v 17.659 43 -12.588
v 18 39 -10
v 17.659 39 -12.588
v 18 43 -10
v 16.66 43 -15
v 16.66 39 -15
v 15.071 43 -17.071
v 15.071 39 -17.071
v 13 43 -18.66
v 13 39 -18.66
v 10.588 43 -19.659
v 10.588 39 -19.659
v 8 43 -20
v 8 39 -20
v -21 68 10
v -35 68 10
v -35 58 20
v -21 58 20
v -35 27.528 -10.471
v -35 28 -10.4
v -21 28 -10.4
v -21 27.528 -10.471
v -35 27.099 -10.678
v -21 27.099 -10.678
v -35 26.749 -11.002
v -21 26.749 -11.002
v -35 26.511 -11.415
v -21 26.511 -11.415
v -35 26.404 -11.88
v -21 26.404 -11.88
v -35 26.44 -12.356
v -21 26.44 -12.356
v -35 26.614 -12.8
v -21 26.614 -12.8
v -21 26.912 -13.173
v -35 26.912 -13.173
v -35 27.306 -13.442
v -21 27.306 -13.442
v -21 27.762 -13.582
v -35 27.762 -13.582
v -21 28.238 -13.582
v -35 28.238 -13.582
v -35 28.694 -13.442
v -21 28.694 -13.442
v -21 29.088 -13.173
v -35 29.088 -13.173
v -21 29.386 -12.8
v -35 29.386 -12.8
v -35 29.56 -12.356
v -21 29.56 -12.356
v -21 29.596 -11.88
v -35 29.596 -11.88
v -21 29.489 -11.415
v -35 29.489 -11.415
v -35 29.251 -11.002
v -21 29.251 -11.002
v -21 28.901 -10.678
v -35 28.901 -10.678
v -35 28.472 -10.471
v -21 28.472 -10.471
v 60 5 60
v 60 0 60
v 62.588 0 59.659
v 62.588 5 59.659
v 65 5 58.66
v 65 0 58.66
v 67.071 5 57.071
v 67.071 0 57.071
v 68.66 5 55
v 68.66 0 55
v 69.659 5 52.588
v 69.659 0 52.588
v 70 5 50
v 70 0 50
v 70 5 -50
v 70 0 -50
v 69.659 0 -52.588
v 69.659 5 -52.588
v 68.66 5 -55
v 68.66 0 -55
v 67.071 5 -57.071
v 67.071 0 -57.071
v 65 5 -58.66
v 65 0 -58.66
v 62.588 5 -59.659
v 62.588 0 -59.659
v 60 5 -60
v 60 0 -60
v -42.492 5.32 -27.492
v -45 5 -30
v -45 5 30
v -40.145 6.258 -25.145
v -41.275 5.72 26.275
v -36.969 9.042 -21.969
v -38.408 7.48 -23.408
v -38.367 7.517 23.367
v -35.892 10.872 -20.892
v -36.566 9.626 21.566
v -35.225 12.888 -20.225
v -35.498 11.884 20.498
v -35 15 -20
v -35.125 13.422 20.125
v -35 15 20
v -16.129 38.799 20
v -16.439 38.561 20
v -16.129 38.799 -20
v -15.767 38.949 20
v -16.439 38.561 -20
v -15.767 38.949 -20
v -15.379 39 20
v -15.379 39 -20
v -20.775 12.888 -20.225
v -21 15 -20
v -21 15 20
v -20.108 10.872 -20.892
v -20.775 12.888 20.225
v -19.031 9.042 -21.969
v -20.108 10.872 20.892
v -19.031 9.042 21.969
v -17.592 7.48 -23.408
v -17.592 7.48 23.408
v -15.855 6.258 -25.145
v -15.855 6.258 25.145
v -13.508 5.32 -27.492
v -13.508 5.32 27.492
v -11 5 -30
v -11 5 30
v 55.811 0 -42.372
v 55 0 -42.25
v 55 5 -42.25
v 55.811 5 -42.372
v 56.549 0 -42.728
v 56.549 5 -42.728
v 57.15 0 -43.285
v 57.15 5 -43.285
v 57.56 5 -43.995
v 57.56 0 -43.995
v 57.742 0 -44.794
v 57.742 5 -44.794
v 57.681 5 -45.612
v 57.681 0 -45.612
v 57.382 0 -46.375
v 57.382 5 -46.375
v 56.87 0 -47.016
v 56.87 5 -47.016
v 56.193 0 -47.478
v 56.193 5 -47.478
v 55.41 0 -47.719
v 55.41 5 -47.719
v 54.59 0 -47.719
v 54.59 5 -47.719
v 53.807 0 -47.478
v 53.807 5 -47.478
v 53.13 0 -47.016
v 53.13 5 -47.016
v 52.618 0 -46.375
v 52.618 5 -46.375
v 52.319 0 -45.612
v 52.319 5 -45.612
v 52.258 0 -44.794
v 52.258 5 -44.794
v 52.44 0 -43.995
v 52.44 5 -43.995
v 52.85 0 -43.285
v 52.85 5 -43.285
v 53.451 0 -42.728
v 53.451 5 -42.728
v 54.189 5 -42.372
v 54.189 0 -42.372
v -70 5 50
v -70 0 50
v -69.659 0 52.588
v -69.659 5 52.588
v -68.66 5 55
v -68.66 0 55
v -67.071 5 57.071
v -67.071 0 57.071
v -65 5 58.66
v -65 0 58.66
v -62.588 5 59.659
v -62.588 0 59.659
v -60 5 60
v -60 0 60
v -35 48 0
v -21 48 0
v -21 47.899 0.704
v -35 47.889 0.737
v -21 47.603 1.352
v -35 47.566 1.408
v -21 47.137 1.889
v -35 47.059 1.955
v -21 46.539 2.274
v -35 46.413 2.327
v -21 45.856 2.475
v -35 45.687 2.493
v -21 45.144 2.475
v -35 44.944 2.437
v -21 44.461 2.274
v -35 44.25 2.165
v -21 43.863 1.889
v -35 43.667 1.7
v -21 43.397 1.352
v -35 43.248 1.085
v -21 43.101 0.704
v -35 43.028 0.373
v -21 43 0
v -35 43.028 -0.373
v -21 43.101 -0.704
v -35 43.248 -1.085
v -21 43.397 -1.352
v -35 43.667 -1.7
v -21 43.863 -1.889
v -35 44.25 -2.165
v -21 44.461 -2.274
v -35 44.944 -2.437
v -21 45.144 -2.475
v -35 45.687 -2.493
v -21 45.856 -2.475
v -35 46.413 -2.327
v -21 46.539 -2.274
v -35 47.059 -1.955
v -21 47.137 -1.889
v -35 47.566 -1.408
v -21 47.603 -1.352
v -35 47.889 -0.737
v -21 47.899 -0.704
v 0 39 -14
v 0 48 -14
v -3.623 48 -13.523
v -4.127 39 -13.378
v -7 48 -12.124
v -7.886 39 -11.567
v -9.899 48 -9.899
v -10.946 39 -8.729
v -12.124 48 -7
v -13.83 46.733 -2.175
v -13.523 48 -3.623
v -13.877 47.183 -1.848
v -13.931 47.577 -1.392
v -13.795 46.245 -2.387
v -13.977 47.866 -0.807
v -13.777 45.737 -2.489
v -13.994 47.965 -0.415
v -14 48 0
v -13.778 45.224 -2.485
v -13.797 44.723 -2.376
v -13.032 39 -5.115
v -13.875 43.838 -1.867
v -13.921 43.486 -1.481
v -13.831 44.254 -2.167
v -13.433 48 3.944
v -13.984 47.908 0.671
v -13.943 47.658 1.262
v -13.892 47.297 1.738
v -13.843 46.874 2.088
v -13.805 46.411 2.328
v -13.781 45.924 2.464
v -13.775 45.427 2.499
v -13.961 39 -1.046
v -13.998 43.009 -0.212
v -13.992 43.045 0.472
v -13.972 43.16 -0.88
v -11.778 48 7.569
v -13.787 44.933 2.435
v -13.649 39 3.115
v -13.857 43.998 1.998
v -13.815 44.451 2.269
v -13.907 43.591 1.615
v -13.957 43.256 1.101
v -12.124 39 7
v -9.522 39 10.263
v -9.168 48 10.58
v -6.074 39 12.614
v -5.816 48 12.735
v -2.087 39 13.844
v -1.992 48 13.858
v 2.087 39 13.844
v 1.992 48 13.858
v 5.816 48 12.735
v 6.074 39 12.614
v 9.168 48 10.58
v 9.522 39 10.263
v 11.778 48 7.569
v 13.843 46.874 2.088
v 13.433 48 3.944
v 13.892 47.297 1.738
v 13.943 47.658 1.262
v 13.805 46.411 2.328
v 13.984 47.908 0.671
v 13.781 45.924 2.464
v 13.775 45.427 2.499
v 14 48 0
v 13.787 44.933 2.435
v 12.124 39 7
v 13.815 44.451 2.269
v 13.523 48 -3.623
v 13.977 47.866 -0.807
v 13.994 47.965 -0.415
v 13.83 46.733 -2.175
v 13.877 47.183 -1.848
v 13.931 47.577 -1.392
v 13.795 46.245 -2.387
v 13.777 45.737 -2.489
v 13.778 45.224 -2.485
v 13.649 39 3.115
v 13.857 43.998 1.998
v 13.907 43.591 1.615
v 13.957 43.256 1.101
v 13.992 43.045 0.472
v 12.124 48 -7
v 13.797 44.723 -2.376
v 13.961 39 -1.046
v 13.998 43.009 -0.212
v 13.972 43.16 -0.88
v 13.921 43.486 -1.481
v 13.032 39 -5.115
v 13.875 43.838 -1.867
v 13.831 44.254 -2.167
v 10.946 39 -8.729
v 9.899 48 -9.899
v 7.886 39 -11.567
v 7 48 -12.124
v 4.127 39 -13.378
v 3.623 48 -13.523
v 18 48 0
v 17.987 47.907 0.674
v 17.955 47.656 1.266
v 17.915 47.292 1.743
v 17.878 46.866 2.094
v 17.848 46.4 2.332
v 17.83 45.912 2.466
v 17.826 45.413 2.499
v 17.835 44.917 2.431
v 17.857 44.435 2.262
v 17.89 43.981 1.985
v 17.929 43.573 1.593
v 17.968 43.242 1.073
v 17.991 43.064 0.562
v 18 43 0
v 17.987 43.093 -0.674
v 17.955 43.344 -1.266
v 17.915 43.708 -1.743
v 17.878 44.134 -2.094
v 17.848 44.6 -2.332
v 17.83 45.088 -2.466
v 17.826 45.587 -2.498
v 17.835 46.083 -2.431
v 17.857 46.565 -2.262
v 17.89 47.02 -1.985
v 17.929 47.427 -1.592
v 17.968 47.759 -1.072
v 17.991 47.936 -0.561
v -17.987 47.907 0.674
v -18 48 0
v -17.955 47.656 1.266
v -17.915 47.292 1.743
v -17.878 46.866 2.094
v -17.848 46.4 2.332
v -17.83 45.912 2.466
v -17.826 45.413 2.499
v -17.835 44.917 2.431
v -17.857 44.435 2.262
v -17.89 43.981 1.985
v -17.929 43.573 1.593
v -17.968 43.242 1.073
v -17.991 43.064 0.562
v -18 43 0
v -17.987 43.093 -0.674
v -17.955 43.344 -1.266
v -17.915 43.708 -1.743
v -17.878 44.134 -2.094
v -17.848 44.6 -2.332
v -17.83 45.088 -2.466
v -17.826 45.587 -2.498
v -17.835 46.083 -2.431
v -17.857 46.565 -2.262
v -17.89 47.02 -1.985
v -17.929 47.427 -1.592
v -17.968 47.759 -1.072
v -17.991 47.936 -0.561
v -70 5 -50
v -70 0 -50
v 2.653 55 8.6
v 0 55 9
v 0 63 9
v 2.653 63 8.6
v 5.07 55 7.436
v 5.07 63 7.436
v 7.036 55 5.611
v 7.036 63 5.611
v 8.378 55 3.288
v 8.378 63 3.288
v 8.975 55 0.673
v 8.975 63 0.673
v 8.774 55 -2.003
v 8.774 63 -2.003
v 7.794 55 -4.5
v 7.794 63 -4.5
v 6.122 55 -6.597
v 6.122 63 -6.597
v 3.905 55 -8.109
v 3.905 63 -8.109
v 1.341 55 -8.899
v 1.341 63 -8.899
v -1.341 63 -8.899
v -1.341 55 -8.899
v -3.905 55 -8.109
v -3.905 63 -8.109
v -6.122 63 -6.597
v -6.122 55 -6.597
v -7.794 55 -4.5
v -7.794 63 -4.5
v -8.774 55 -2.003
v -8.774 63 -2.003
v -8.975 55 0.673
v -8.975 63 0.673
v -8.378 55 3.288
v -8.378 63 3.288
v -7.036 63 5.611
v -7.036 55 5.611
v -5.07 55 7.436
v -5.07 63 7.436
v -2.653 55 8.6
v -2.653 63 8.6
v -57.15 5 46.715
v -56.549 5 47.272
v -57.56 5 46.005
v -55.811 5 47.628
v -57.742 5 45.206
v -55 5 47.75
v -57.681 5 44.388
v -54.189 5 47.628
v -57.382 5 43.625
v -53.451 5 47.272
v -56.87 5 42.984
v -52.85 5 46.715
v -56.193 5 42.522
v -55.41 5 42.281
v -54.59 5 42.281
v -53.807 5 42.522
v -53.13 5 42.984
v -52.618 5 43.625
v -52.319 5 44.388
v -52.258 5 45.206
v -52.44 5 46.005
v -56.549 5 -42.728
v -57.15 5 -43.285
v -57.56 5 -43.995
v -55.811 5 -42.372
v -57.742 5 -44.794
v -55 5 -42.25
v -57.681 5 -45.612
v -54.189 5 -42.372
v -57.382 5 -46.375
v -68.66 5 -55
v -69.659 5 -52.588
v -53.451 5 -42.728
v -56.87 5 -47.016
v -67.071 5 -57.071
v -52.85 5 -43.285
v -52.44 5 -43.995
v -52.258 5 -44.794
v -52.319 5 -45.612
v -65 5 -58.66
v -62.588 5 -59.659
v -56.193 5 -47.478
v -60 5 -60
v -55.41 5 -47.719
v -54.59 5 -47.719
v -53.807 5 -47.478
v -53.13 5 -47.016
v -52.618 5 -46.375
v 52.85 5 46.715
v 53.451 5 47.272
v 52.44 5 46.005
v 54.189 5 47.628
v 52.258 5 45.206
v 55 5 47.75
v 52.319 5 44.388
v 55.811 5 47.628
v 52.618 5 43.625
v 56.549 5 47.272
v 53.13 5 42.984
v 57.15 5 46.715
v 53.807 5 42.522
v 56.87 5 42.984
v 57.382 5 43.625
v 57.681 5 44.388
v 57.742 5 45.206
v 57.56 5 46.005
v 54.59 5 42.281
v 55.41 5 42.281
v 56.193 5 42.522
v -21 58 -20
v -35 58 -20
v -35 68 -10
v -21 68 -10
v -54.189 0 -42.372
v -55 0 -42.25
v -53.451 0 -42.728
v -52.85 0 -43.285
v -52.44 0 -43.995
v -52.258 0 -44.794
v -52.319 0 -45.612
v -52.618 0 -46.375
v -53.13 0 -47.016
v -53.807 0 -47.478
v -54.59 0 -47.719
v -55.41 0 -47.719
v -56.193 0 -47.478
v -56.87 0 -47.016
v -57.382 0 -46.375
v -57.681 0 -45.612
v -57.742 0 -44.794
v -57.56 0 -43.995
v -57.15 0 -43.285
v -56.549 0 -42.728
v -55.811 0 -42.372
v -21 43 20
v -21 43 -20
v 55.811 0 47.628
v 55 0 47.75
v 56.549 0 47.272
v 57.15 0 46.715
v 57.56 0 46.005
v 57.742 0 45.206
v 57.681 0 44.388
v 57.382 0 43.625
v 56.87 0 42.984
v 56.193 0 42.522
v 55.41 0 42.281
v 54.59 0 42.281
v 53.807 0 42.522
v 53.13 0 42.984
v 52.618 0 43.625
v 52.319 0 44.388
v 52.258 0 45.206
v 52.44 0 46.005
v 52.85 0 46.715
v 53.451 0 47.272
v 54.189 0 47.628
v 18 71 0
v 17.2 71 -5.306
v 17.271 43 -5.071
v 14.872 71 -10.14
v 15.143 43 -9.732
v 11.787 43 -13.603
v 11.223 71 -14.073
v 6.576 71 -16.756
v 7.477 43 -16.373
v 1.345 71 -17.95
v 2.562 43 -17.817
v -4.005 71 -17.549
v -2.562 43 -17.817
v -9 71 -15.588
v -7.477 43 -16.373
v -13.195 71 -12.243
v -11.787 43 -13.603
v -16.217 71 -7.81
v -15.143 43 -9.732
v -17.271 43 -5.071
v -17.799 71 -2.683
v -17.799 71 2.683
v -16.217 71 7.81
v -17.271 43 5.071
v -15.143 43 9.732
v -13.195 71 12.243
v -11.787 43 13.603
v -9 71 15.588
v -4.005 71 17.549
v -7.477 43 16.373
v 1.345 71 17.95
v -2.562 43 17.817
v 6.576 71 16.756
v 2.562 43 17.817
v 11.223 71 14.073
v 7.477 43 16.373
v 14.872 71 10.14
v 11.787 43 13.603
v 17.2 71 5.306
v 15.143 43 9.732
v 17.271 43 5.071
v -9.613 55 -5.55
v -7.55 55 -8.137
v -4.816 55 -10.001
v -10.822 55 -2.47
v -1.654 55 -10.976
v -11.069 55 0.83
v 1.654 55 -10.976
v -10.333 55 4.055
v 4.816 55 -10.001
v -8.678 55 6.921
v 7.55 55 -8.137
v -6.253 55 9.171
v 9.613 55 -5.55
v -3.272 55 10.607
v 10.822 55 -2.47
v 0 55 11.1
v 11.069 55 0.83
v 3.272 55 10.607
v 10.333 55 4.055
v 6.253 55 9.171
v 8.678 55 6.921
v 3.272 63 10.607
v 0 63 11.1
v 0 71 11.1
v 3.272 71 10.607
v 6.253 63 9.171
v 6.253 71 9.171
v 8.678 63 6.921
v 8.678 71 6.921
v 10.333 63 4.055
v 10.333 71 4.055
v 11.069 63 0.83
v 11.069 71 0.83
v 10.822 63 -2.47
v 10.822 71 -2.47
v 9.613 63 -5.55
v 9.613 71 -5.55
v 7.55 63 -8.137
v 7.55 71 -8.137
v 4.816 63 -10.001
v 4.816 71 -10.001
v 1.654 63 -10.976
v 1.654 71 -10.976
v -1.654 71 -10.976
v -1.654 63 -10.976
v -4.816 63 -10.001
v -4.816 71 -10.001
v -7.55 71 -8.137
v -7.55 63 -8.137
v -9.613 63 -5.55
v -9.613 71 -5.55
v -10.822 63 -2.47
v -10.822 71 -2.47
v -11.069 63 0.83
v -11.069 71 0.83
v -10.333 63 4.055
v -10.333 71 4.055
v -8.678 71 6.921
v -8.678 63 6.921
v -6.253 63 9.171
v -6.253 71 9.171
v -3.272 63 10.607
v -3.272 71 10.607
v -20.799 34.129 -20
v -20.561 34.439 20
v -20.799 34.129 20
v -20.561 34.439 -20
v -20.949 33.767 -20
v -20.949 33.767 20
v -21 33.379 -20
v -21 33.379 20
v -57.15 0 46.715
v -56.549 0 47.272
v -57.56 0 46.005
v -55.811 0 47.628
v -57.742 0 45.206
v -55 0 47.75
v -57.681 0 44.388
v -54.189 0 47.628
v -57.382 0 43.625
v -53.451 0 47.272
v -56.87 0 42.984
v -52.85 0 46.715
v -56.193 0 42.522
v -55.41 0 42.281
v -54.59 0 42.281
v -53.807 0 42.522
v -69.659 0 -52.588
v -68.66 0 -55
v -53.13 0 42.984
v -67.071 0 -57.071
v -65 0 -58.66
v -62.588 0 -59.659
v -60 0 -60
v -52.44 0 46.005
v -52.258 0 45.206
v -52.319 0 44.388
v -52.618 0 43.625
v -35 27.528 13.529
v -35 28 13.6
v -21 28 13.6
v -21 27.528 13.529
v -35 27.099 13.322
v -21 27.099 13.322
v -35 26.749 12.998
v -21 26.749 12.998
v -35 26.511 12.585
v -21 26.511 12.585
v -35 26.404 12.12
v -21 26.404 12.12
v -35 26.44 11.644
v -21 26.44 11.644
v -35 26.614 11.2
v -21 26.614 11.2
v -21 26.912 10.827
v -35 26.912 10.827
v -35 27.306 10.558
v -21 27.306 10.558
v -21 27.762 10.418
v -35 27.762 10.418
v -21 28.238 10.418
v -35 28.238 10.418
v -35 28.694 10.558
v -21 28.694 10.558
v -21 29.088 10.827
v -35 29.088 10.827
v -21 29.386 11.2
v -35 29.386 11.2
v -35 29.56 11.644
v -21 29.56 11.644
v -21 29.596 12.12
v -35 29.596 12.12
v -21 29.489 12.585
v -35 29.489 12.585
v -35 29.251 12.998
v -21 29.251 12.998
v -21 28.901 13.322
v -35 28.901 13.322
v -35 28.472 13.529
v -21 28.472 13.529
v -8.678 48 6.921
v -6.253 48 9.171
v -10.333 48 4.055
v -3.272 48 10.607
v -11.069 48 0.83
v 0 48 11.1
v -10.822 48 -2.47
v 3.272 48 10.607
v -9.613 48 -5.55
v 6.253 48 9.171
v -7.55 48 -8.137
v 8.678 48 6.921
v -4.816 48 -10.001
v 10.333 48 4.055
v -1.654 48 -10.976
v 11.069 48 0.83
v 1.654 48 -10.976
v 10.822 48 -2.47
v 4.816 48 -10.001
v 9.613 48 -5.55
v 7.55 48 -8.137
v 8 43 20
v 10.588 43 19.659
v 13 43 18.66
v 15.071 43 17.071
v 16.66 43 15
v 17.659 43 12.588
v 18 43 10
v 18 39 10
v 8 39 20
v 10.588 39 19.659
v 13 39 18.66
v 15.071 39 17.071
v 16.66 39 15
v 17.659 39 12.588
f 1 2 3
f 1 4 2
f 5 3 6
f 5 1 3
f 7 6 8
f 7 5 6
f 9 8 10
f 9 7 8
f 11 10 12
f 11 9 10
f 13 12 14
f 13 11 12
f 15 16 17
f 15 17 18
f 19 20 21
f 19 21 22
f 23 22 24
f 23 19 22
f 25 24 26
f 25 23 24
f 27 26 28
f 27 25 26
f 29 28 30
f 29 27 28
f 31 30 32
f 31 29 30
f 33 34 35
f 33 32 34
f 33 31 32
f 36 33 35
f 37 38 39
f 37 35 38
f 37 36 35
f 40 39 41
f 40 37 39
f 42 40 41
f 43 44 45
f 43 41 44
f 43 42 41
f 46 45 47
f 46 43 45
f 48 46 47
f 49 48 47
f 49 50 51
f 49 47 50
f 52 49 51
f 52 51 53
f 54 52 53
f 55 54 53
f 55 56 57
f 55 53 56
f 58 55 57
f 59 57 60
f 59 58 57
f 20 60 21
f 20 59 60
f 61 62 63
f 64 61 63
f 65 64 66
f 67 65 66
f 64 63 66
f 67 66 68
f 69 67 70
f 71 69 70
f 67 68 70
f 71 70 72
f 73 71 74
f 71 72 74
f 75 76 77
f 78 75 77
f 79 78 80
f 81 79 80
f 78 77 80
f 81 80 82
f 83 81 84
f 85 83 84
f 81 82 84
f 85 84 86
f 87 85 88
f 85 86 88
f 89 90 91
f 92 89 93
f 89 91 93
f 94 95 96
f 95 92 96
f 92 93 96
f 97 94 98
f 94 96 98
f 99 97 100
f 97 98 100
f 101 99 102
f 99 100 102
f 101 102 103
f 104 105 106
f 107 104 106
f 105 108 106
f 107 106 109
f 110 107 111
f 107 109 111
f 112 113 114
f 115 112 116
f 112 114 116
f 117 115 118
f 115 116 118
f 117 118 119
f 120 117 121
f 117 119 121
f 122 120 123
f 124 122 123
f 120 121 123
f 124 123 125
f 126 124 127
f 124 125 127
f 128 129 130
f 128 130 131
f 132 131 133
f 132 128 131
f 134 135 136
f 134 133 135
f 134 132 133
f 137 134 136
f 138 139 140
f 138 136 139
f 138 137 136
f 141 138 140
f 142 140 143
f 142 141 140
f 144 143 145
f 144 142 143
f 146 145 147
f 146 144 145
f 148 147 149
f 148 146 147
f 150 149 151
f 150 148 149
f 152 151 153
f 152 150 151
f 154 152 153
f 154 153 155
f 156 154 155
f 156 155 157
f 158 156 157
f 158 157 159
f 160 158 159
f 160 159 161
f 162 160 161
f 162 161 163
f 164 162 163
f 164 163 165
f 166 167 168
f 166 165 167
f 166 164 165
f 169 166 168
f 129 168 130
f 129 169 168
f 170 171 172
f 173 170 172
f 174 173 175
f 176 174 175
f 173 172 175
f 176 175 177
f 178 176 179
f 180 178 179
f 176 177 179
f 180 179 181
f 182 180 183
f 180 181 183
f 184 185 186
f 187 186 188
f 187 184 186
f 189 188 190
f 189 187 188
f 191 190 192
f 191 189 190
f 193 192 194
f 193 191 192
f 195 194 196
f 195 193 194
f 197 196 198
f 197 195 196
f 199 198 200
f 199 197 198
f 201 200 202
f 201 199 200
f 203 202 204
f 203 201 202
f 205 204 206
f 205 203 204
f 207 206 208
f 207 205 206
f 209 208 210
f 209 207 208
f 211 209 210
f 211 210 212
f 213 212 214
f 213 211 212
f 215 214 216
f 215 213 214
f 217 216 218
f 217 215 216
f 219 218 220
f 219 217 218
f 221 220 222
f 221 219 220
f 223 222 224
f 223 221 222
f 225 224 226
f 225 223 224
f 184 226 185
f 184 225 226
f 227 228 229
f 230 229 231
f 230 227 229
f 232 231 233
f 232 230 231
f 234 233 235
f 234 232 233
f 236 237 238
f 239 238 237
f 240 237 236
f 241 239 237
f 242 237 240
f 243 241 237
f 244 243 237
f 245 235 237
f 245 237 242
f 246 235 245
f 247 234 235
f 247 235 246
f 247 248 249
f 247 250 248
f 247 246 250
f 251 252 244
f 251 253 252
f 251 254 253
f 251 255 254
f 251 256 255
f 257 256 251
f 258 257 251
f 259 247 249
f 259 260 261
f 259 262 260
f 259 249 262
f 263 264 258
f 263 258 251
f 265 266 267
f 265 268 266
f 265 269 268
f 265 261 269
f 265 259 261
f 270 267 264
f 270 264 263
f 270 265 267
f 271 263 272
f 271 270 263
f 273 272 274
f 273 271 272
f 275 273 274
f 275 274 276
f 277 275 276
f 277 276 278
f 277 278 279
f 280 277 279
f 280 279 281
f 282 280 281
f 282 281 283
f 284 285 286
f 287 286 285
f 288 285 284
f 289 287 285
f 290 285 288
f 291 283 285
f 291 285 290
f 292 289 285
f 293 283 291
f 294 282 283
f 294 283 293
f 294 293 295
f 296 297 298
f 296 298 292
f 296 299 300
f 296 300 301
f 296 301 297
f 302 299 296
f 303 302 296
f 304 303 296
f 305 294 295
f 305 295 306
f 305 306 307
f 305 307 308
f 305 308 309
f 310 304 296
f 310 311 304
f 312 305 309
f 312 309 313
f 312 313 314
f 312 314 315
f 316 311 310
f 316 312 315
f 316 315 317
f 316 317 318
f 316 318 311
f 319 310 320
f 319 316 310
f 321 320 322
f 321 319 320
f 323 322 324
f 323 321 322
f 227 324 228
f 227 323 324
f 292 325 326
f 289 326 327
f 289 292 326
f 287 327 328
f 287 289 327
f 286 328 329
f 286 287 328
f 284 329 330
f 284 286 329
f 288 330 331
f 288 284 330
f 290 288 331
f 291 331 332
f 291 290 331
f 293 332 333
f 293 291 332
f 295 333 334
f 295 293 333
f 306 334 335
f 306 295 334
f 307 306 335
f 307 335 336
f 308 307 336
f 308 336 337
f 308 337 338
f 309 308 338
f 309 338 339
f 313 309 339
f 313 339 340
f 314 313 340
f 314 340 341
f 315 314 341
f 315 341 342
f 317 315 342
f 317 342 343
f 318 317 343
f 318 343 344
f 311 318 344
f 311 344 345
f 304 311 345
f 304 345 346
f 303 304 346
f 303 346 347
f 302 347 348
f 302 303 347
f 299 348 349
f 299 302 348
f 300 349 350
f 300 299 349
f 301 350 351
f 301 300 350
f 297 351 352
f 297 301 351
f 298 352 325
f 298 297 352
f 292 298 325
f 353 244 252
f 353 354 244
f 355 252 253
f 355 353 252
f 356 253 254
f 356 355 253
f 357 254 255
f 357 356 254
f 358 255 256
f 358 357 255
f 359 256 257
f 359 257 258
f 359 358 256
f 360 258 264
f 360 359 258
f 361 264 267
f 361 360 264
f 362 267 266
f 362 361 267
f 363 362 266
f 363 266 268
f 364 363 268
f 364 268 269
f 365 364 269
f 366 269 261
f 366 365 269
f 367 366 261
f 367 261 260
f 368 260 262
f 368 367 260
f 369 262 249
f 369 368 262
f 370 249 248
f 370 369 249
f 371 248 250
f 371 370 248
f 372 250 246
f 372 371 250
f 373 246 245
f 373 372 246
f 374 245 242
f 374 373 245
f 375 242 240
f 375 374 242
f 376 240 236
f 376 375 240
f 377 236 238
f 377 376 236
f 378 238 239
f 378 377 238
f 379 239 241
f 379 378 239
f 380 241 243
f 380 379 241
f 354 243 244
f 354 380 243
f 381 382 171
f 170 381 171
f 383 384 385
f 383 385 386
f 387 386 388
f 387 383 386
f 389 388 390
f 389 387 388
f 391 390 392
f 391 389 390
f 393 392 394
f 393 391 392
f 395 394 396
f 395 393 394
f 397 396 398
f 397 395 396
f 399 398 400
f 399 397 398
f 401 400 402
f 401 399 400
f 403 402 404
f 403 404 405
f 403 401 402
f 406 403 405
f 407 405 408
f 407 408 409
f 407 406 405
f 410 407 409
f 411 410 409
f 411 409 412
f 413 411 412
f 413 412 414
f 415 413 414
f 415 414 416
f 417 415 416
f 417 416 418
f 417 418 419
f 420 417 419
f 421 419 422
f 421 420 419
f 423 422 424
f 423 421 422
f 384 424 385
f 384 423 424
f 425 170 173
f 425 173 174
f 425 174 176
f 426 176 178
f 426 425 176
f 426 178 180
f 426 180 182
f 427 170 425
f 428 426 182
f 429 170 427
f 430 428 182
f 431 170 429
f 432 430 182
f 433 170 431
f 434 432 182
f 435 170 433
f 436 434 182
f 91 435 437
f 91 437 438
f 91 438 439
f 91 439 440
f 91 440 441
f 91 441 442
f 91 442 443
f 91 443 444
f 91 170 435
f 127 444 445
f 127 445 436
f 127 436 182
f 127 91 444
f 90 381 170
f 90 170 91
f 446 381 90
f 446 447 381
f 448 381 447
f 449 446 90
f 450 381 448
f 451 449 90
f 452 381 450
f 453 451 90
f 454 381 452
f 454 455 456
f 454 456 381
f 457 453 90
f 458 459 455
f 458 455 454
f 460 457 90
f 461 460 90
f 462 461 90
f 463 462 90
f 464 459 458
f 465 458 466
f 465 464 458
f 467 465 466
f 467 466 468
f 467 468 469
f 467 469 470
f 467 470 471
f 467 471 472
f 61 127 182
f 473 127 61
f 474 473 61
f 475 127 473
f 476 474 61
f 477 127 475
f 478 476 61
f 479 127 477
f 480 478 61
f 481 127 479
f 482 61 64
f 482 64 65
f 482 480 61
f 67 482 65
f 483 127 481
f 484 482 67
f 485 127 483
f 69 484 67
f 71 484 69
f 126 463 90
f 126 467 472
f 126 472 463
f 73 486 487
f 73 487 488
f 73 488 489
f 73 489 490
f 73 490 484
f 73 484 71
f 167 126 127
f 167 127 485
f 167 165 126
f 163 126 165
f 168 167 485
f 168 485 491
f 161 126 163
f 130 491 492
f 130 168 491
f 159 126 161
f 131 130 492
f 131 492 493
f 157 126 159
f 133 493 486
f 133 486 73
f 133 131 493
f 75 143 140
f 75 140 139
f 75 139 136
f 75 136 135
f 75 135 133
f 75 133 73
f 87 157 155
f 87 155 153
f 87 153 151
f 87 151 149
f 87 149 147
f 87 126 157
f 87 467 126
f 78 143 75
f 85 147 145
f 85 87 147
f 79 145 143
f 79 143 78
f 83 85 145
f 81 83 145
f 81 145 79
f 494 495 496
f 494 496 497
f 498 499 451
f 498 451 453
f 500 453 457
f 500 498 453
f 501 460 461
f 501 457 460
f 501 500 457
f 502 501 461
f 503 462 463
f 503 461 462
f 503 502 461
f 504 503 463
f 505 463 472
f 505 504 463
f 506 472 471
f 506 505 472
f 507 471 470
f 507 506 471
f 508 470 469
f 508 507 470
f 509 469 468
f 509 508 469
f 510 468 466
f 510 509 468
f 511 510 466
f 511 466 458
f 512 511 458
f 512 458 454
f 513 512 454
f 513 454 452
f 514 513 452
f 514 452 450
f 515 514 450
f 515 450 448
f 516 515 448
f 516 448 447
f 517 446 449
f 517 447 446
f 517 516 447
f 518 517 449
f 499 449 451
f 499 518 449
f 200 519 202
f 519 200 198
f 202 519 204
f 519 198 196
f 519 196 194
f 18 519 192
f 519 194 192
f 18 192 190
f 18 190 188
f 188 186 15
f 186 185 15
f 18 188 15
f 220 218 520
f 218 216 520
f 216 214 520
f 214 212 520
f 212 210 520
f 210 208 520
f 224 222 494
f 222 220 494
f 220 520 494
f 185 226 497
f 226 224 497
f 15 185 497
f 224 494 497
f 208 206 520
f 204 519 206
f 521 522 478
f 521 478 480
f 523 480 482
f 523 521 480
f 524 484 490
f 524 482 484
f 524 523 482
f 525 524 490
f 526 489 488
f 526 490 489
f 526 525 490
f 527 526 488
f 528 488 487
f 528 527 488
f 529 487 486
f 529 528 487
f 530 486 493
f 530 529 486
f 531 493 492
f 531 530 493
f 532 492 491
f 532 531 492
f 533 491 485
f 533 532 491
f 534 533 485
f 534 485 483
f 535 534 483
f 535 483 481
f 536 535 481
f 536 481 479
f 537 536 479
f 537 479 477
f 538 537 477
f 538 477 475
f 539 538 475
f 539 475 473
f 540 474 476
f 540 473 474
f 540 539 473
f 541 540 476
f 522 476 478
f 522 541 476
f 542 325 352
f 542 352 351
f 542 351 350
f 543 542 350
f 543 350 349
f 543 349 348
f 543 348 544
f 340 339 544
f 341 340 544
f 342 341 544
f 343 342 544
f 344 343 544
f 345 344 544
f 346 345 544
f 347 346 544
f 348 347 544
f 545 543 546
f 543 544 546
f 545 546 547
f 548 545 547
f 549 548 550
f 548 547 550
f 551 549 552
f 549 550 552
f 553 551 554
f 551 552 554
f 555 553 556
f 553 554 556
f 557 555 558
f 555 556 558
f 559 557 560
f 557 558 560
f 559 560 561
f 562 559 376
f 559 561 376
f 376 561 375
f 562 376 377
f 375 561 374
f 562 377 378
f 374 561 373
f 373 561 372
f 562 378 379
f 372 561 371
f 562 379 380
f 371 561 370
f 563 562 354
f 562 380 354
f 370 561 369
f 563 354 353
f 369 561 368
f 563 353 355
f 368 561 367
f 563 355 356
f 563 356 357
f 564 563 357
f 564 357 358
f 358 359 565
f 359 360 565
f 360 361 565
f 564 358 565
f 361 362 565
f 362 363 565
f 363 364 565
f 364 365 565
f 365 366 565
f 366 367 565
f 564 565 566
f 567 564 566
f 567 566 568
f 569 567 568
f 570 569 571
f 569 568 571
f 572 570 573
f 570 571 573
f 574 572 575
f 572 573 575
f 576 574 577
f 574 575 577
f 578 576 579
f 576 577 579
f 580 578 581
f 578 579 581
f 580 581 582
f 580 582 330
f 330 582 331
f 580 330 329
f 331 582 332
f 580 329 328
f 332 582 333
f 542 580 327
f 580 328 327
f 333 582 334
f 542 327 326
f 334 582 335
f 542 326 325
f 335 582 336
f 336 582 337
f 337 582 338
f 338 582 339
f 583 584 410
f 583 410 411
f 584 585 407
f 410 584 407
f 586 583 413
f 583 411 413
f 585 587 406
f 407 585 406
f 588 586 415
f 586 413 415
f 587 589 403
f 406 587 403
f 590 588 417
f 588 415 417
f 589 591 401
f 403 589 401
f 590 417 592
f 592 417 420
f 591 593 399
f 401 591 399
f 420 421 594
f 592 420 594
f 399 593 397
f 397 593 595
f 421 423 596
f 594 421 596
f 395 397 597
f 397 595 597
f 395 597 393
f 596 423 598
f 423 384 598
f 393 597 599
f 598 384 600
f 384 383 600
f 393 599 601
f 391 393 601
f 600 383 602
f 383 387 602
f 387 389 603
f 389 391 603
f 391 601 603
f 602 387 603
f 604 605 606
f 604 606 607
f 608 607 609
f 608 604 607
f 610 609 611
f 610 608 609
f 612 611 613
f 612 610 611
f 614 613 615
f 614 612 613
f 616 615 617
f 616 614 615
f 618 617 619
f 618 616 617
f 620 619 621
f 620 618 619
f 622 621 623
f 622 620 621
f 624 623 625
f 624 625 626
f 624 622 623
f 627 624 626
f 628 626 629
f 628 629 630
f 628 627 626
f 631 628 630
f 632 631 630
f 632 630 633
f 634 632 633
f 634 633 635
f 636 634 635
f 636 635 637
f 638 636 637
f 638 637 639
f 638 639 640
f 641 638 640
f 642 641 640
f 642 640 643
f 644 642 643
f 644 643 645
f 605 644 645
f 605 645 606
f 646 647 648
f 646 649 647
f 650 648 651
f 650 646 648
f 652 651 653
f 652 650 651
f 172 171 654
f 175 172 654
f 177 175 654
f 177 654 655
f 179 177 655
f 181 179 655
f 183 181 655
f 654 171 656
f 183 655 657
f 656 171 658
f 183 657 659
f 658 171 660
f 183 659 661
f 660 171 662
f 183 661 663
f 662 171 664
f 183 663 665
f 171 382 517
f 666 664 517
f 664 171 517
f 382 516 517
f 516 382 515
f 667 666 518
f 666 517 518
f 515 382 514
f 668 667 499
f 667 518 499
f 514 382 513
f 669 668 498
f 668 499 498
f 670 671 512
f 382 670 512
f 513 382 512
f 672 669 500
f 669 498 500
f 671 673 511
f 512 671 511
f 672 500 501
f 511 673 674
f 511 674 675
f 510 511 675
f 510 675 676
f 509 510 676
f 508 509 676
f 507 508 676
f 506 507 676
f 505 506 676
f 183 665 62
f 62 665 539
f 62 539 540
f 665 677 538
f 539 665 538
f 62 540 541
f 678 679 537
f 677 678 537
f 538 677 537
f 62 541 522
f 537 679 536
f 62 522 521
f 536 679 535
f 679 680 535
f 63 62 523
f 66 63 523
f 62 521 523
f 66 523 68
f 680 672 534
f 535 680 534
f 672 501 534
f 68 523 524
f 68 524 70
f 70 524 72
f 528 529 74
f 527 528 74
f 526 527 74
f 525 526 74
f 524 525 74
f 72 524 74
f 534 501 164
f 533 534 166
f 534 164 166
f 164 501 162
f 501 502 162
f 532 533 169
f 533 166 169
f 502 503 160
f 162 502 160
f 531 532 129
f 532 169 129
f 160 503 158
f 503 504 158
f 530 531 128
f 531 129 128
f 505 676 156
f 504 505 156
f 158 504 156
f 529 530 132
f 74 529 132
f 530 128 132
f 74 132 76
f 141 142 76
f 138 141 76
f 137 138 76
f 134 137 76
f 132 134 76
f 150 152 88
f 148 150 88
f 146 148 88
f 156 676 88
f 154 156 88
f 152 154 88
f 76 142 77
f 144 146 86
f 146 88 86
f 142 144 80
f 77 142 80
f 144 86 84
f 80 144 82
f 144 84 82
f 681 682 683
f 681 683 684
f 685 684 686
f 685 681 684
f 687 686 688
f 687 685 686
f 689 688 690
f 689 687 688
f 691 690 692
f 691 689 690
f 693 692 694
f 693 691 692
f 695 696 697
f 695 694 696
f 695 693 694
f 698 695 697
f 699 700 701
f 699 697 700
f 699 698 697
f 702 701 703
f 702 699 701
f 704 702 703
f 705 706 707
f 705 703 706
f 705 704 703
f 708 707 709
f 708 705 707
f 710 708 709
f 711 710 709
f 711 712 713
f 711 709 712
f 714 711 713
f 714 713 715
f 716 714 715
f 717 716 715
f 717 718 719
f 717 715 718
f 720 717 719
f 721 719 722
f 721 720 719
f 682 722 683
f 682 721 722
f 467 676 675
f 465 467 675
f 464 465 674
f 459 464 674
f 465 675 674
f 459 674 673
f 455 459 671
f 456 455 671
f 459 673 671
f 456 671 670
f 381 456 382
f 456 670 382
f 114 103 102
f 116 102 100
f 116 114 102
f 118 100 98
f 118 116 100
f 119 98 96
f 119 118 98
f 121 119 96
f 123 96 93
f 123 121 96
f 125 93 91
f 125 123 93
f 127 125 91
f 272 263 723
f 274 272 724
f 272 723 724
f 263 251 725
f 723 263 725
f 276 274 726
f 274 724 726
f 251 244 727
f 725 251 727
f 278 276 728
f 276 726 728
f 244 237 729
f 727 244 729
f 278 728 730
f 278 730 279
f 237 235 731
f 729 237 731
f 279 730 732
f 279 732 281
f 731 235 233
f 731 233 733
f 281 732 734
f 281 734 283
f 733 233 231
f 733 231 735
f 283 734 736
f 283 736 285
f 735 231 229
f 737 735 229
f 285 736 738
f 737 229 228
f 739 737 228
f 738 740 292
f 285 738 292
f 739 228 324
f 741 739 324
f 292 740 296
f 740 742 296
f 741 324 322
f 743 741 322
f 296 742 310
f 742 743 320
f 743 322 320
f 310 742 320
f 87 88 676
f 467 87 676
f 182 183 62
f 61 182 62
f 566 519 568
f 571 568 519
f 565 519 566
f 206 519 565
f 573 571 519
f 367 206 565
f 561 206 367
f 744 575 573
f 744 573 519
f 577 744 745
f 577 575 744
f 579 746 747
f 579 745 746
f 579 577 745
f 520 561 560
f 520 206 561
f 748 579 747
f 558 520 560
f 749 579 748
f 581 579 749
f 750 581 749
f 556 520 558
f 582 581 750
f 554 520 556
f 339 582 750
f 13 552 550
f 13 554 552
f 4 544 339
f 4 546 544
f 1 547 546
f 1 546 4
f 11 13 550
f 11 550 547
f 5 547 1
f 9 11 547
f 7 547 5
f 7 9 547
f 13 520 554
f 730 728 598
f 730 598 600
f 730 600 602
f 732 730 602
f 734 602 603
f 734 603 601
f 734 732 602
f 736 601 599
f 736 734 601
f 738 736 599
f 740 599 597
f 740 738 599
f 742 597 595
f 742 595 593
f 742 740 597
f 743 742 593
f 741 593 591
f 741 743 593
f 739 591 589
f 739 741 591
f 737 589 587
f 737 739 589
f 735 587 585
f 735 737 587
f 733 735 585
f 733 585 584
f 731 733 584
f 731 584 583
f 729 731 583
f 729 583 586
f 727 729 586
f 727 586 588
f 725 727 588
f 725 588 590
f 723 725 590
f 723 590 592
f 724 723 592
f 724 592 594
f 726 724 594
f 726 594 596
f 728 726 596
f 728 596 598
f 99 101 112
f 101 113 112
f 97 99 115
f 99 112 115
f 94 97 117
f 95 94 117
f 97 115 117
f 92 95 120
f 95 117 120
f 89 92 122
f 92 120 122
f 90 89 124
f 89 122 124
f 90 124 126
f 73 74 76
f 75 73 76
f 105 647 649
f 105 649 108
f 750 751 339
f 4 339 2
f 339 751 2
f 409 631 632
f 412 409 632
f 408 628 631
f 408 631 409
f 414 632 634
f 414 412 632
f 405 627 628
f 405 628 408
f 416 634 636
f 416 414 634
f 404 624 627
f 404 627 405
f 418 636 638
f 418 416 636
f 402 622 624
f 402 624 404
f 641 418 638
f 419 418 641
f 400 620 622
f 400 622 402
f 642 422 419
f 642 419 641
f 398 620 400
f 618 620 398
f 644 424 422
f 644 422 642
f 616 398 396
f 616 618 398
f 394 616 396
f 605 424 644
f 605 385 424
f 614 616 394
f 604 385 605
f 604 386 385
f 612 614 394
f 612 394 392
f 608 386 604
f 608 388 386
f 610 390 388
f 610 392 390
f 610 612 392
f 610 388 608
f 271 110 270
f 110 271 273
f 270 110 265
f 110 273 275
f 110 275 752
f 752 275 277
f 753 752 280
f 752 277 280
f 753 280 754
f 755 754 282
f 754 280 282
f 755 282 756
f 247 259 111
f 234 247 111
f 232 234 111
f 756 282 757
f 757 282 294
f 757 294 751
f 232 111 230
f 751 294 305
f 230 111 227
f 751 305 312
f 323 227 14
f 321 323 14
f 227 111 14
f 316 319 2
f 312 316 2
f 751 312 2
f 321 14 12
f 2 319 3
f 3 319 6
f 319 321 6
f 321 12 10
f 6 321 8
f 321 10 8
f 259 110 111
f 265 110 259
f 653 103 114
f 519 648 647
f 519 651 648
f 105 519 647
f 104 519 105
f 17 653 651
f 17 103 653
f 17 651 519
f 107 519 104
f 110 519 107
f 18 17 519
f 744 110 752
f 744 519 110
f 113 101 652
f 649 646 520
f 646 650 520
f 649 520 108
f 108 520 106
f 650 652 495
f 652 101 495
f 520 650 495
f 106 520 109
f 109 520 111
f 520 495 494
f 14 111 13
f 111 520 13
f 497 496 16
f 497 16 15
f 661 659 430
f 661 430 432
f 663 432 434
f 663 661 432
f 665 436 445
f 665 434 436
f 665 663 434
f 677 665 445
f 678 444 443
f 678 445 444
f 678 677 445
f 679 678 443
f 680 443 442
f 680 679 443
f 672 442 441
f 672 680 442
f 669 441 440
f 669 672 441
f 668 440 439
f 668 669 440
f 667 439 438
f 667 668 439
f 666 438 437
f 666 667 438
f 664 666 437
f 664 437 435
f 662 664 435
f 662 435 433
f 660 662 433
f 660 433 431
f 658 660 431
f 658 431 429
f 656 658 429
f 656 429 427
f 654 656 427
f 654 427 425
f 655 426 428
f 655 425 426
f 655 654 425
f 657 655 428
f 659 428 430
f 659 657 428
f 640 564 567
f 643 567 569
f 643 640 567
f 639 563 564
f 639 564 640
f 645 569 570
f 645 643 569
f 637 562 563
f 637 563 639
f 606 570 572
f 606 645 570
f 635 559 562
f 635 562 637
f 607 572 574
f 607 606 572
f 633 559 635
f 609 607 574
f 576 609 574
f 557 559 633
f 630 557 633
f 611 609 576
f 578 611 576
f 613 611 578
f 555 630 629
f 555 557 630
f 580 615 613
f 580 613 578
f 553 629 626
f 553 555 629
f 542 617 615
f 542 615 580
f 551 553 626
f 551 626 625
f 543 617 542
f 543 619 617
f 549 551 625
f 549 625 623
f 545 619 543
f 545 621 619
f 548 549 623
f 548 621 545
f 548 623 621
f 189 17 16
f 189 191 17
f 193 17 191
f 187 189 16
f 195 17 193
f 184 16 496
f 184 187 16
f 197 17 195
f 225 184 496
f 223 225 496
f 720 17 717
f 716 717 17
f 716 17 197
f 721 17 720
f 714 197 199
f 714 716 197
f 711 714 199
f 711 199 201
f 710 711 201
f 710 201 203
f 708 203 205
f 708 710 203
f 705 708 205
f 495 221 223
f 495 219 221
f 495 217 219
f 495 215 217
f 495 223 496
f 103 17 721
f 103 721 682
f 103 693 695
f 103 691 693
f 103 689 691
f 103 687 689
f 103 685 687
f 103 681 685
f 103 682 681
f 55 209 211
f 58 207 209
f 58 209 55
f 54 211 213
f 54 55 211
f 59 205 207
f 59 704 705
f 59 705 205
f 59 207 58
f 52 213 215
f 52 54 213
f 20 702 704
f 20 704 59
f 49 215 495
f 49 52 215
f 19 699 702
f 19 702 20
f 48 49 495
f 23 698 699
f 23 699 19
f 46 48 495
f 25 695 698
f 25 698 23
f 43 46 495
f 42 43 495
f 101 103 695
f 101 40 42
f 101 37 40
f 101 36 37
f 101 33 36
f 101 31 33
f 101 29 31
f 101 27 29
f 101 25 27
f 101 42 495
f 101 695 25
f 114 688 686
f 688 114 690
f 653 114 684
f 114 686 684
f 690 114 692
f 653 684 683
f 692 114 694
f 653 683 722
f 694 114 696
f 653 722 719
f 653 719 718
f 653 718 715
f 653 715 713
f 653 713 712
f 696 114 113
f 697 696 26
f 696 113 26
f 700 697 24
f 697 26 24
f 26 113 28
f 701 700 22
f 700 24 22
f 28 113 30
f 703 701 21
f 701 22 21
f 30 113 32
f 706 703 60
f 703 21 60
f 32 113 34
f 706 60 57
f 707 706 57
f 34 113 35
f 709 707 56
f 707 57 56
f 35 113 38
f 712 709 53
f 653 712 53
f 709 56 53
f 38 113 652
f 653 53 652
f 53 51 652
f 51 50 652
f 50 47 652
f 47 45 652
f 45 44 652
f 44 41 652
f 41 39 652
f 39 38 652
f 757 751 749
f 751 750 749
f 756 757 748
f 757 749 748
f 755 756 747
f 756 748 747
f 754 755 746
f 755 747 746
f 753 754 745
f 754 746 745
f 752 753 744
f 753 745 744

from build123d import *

# Parameters (mm, degrees)
BENCH_FOOTPRINT_140X120_DEPTH           = 5
BACKBONE_START                          = -20
BACKBONE_PROFILE_W                      = 14
BACKBONE_PROFILE_H                      = 63
BACKBONE_DEPTH                          = 40
REMOVABLE_SERVO_MOUNT_M3_START          = -40
REMOVABLE_SERVO_MOUNT_M3_PROFILE_R      = 1.6
REMOVABLE_SERVO_MOUNT_M3_DEPTH          = 155.560027933
BEARING_BRIDGE_START                    = 39
BEARING_BRIDGE_PROFILE_W                = 53
BEARING_BRIDGE_PROFILE_H                = 40
BEARING_BRIDGE_DEPTH                    = 4
BRIDGE_HORN_CLEARANCE_START             = 38
BRIDGE_HORN_CLEARANCE_PROFILE_R         = 14
BRIDGE_HORN_CLEARANCE_DEPTH             = 77.560027933
DRIVE_COLLAR_CHAMBER_START              = 43
DRIVE_COLLAR_CHAMBER_PROFILE_R          = 18
DRIVE_COLLAR_CHAMBER_PROFILE_R_2        = 14
DRIVE_COLLAR_CHAMBER_DEPTH              = 5
BEARING_TOWER_START                     = 48
BEARING_TOWER_PROFILE_R                 = 18
BEARING_TOWER_PROFILE_R_2               = 11.1
BEARING_TOWER_DEPTH                     = 23
BEARING_SEPARATION_SHOULDER_START       = 55
BEARING_SEPARATION_SHOULDER_PROFILE_R   = 11.1
BEARING_SEPARATION_SHOULDER_PROFILE_R_2 = 9
BEARING_SEPARATION_SHOULDER_DEPTH       = 8
BENCH_CLAMP_HOLES_START                 = -1
BENCH_CLAMP_HOLES_PROFILE_R             = 2.75
BENCH_CLAMP_HOLES_DEPTH                 = 118.365802537
YAW_CROSSBOLT_ACCESS_START              = -40
YAW_CROSSBOLT_ACCESS_PROFILE_R          = 2.5
YAW_CROSSBOLT_ACCESS_DEPTH              = 157.365802537
FILLET2_R                               = 10
BOSS_EXTRUDE1_DEPTH                     = 40
FILLET6_R                               = 1.5
FILLET7_R                               = 10
CHAMFER1_SIZE                           = 10


with BuildPart() as part:
    # Bench_footprint_140x120_profile → Bench_footprint_140x120 (new body)
    with BuildSketch(Plane(origin=(0, 0, 0), x_dir=(1, 0, 0), z_dir=(0, 1, 0))):
        with BuildLine():
            Line((-60, -60), (60, -60))
            ThreePointArc((60, -60), (67.071067812, -57.071067812), (70, -50))
            Line((70, -50), (70, 50))
            ThreePointArc((70, 50), (67.071067812, 57.071067812), (60, 60))
            Line((60, 60), (-60, 60))
            ThreePointArc((-60, 60), (-67.071067812, 57.071067812), (-70, 50))
            Line((-70, 50), (-70, -50))
            ThreePointArc((-70, -50), (-67.071067812, -57.071067812), (-60, -60))
        make_face()
    extrude(amount=BENCH_FOOTPRINT_140X120_DEPTH)

    # Backbone_profile → Backbone (add)
    with BuildSketch(Plane.XY.offset(BACKBONE_START)):
        with Locations((-28, 36.5)):
            Rectangle(BACKBONE_PROFILE_W, BACKBONE_PROFILE_H)
    extrude(amount=BACKBONE_DEPTH)

    # Removable_servo_mount_M3_profile → Removable_servo_mount_M3 (cut, through all)
    with BuildSketch(Plane(origin=(0, 0, 0), x_dir=(0, 0, -1), z_dir=(1, 0, 0)).offset(REMOVABLE_SERVO_MOUNT_M3_START)):
        with Locations(Location((12, 28, 0), (0, 0, 180))):
            Circle(REMOVABLE_SERVO_MOUNT_M3_PROFILE_R)
        with Locations(Location((-12, 28, 0), (0, 0, 180))):
            Circle(REMOVABLE_SERVO_MOUNT_M3_PROFILE_R)
    extrude(amount=REMOVABLE_SERVO_MOUNT_M3_DEPTH, mode=Mode.SUBTRACT)

    # Bearing_bridge_profile → Bearing_bridge (add)
    with BuildSketch(Plane(origin=(0, 0, 0), x_dir=(1, 0, 0), z_dir=(0, 1, 0)).offset(BEARING_BRIDGE_START)):
        with Locations((-8.5, 0)):
            Rectangle(BEARING_BRIDGE_PROFILE_W, BEARING_BRIDGE_PROFILE_H)
    extrude(amount=BEARING_BRIDGE_DEPTH)

    # Bridge_horn_clearance_profile → Bridge_horn_clearance (cut, through all)
    with BuildSketch(Plane(origin=(0, 0, 0), x_dir=(1, 0, 0), z_dir=(0, 1, 0)).offset(BRIDGE_HORN_CLEARANCE_START)):
        with Locations(Location((0, 0, 0), (0, 0, 90))):
            Circle(BRIDGE_HORN_CLEARANCE_PROFILE_R)
    extrude(amount=BRIDGE_HORN_CLEARANCE_DEPTH, mode=Mode.SUBTRACT)

    # Drive_collar_chamber_profile → Drive_collar_chamber (add)
    with BuildSketch(Plane(origin=(0, 0, 0), x_dir=(1, 0, 0), z_dir=(0, 1, 0)).offset(DRIVE_COLLAR_CHAMBER_START)):
        Circle(DRIVE_COLLAR_CHAMBER_PROFILE_R)
        with Locations(Location((0, 0, 0), (0, 0, 90))):
            Circle(DRIVE_COLLAR_CHAMBER_PROFILE_R_2, mode=Mode.SUBTRACT)
    extrude(amount=DRIVE_COLLAR_CHAMBER_DEPTH)

    # Bearing_tower_profile → Bearing_tower (add)
    with BuildSketch(Plane(origin=(0, 0, 0), x_dir=(1, 0, 0), z_dir=(0, 1, 0)).offset(BEARING_TOWER_START)):
        Circle(BEARING_TOWER_PROFILE_R)
        with Locations(Location((0, 0, 0), (0, 0, 270))):
            Circle(BEARING_TOWER_PROFILE_R_2, mode=Mode.SUBTRACT)
    extrude(amount=BEARING_TOWER_DEPTH)

    # Bearing_separation_shoulder_profile → Bearing_separation_shoulder (add)
    with BuildSketch(Plane(origin=(0, 0, 0), x_dir=(1, 0, 0), z_dir=(0, 1, 0)).offset(BEARING_SEPARATION_SHOULDER_START)):
        with Locations(Location((0, 0, 0), (0, 0, 270))):
            Circle(BEARING_SEPARATION_SHOULDER_PROFILE_R)
        with Locations(Location((0, 0, 0), (0, 0, 270))):
            Circle(BEARING_SEPARATION_SHOULDER_PROFILE_R_2, mode=Mode.SUBTRACT)
    extrude(amount=BEARING_SEPARATION_SHOULDER_DEPTH)

    # Bench_clamp_holes_profile → Bench_clamp_holes (cut, through all)
    with BuildSketch(Plane(origin=(0, 0, 0), x_dir=(1, 0, 0), z_dir=(0, 1, 0)).offset(BENCH_CLAMP_HOLES_START)):
        with Locations(Location((-55, -45, 0), (0, 0, 270))):
            Circle(BENCH_CLAMP_HOLES_PROFILE_R)
        with Locations(Location((55, -45, 0), (0, 0, 270))):
            Circle(BENCH_CLAMP_HOLES_PROFILE_R)
        with Locations(Location((-55, 45, 0), (0, 0, 270))):
            Circle(BENCH_CLAMP_HOLES_PROFILE_R)
        with Locations(Location((55, 45, 0), (0, 0, 270))):
            Circle(BENCH_CLAMP_HOLES_PROFILE_R)
    extrude(amount=BENCH_CLAMP_HOLES_DEPTH, mode=Mode.SUBTRACT)

    # Yaw_crossbolt_access_profile → Yaw_crossbolt_access (cut, through all)
    with BuildSketch(Plane(origin=(0, 0, 0), x_dir=(0, 0, -1), z_dir=(1, 0, 0)).offset(YAW_CROSSBOLT_ACCESS_START)):
        with Locations(Location((0, 45.5, 0), (0, 0, 90))):
            Circle(YAW_CROSSBOLT_ACCESS_PROFILE_R)
    extrude(amount=YAW_CROSSBOLT_ACCESS_DEPTH, mode=Mode.SUBTRACT)

    # Fillet2
    fillet2_edges = [part.edges().sort_by_distance(p)[0] for p in [
        (18, 41, -20),
        (18, 41, 20),
    ]]
    fillet(fillet2_edges, radius=FILLET2_R)

    # Sketch1 → Boss-Extrude1 (add)
    with BuildSketch(Plane.XY.offset(20)):
        Polygon((-21, 34), (-16, 39), (-21, 39), align=None)
    extrude(amount=-BOSS_EXTRUDE1_DEPTH)

    # Fillet6
    fillet6_edges = [part.edges().sort_by_distance(p)[0] for p in [
        (-16, 39, 0),
        (-21, 34, 0),
    ]]
    fillet(fillet6_edges, radius=FILLET6_R)

    # Fillet7
    fillet7_edges = [part.edges().sort_by_distance(p)[0] for p in [
        (-28, 5, -20),
        (-35, 5, 0),
        (-21, 5, 0),
        (-28, 5, 20),
    ]]
    fillet(fillet7_edges, radius=FILLET7_R)

    # Chamfer1
    chamfer1_edges = [part.edges().sort_by_distance(p)[0] for p in [
        (-28, 68, -20),
        (-28, 68, 20),
    ]]
    chamfer(chamfer1_edges, length=CHAMFER1_SIZE)


solid = part.part
